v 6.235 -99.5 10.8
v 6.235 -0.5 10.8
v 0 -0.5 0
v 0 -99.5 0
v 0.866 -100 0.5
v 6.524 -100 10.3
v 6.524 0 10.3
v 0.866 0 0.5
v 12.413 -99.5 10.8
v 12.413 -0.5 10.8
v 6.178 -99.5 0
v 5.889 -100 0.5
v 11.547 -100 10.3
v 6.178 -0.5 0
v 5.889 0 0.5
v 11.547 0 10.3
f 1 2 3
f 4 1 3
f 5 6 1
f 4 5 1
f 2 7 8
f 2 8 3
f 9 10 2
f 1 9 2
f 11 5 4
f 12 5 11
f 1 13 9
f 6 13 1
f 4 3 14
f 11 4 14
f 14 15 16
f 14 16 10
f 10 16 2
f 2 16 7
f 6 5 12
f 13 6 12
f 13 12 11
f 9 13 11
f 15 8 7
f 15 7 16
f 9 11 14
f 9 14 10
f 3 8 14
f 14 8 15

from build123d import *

# Parameters (mm, degrees)
F1_DEPTH = 100
F2_SIZE  = 0.5


with BuildPart() as f1:
    # F0 (on Front) → F1 (new body)
    with BuildSketch(Plane.XZ):
        Polygon((6.235383, 10.8), (0, 0), (6.177648, 0), (12.413031, 10.8), align=None)
    extrude(amount=F1_DEPTH)

    # F2
    f2_edges = [f1.edges().sort_by_distance(p)[0] for p in [
        (9.324207, -100, 10.8),
        (3.117691, -100, 5.4),
        (9.295339, -100, 5.4),
        (3.088824, -100, 0),
        (9.295339, 0, 5.4),
        (3.117691, 0, 5.4),
        (3.088824, 0, 0),
        (9.324207, 0, 10.8),
    ]]
    chamfer(f2_edges, length=F2_SIZE)


solid = f1.part
